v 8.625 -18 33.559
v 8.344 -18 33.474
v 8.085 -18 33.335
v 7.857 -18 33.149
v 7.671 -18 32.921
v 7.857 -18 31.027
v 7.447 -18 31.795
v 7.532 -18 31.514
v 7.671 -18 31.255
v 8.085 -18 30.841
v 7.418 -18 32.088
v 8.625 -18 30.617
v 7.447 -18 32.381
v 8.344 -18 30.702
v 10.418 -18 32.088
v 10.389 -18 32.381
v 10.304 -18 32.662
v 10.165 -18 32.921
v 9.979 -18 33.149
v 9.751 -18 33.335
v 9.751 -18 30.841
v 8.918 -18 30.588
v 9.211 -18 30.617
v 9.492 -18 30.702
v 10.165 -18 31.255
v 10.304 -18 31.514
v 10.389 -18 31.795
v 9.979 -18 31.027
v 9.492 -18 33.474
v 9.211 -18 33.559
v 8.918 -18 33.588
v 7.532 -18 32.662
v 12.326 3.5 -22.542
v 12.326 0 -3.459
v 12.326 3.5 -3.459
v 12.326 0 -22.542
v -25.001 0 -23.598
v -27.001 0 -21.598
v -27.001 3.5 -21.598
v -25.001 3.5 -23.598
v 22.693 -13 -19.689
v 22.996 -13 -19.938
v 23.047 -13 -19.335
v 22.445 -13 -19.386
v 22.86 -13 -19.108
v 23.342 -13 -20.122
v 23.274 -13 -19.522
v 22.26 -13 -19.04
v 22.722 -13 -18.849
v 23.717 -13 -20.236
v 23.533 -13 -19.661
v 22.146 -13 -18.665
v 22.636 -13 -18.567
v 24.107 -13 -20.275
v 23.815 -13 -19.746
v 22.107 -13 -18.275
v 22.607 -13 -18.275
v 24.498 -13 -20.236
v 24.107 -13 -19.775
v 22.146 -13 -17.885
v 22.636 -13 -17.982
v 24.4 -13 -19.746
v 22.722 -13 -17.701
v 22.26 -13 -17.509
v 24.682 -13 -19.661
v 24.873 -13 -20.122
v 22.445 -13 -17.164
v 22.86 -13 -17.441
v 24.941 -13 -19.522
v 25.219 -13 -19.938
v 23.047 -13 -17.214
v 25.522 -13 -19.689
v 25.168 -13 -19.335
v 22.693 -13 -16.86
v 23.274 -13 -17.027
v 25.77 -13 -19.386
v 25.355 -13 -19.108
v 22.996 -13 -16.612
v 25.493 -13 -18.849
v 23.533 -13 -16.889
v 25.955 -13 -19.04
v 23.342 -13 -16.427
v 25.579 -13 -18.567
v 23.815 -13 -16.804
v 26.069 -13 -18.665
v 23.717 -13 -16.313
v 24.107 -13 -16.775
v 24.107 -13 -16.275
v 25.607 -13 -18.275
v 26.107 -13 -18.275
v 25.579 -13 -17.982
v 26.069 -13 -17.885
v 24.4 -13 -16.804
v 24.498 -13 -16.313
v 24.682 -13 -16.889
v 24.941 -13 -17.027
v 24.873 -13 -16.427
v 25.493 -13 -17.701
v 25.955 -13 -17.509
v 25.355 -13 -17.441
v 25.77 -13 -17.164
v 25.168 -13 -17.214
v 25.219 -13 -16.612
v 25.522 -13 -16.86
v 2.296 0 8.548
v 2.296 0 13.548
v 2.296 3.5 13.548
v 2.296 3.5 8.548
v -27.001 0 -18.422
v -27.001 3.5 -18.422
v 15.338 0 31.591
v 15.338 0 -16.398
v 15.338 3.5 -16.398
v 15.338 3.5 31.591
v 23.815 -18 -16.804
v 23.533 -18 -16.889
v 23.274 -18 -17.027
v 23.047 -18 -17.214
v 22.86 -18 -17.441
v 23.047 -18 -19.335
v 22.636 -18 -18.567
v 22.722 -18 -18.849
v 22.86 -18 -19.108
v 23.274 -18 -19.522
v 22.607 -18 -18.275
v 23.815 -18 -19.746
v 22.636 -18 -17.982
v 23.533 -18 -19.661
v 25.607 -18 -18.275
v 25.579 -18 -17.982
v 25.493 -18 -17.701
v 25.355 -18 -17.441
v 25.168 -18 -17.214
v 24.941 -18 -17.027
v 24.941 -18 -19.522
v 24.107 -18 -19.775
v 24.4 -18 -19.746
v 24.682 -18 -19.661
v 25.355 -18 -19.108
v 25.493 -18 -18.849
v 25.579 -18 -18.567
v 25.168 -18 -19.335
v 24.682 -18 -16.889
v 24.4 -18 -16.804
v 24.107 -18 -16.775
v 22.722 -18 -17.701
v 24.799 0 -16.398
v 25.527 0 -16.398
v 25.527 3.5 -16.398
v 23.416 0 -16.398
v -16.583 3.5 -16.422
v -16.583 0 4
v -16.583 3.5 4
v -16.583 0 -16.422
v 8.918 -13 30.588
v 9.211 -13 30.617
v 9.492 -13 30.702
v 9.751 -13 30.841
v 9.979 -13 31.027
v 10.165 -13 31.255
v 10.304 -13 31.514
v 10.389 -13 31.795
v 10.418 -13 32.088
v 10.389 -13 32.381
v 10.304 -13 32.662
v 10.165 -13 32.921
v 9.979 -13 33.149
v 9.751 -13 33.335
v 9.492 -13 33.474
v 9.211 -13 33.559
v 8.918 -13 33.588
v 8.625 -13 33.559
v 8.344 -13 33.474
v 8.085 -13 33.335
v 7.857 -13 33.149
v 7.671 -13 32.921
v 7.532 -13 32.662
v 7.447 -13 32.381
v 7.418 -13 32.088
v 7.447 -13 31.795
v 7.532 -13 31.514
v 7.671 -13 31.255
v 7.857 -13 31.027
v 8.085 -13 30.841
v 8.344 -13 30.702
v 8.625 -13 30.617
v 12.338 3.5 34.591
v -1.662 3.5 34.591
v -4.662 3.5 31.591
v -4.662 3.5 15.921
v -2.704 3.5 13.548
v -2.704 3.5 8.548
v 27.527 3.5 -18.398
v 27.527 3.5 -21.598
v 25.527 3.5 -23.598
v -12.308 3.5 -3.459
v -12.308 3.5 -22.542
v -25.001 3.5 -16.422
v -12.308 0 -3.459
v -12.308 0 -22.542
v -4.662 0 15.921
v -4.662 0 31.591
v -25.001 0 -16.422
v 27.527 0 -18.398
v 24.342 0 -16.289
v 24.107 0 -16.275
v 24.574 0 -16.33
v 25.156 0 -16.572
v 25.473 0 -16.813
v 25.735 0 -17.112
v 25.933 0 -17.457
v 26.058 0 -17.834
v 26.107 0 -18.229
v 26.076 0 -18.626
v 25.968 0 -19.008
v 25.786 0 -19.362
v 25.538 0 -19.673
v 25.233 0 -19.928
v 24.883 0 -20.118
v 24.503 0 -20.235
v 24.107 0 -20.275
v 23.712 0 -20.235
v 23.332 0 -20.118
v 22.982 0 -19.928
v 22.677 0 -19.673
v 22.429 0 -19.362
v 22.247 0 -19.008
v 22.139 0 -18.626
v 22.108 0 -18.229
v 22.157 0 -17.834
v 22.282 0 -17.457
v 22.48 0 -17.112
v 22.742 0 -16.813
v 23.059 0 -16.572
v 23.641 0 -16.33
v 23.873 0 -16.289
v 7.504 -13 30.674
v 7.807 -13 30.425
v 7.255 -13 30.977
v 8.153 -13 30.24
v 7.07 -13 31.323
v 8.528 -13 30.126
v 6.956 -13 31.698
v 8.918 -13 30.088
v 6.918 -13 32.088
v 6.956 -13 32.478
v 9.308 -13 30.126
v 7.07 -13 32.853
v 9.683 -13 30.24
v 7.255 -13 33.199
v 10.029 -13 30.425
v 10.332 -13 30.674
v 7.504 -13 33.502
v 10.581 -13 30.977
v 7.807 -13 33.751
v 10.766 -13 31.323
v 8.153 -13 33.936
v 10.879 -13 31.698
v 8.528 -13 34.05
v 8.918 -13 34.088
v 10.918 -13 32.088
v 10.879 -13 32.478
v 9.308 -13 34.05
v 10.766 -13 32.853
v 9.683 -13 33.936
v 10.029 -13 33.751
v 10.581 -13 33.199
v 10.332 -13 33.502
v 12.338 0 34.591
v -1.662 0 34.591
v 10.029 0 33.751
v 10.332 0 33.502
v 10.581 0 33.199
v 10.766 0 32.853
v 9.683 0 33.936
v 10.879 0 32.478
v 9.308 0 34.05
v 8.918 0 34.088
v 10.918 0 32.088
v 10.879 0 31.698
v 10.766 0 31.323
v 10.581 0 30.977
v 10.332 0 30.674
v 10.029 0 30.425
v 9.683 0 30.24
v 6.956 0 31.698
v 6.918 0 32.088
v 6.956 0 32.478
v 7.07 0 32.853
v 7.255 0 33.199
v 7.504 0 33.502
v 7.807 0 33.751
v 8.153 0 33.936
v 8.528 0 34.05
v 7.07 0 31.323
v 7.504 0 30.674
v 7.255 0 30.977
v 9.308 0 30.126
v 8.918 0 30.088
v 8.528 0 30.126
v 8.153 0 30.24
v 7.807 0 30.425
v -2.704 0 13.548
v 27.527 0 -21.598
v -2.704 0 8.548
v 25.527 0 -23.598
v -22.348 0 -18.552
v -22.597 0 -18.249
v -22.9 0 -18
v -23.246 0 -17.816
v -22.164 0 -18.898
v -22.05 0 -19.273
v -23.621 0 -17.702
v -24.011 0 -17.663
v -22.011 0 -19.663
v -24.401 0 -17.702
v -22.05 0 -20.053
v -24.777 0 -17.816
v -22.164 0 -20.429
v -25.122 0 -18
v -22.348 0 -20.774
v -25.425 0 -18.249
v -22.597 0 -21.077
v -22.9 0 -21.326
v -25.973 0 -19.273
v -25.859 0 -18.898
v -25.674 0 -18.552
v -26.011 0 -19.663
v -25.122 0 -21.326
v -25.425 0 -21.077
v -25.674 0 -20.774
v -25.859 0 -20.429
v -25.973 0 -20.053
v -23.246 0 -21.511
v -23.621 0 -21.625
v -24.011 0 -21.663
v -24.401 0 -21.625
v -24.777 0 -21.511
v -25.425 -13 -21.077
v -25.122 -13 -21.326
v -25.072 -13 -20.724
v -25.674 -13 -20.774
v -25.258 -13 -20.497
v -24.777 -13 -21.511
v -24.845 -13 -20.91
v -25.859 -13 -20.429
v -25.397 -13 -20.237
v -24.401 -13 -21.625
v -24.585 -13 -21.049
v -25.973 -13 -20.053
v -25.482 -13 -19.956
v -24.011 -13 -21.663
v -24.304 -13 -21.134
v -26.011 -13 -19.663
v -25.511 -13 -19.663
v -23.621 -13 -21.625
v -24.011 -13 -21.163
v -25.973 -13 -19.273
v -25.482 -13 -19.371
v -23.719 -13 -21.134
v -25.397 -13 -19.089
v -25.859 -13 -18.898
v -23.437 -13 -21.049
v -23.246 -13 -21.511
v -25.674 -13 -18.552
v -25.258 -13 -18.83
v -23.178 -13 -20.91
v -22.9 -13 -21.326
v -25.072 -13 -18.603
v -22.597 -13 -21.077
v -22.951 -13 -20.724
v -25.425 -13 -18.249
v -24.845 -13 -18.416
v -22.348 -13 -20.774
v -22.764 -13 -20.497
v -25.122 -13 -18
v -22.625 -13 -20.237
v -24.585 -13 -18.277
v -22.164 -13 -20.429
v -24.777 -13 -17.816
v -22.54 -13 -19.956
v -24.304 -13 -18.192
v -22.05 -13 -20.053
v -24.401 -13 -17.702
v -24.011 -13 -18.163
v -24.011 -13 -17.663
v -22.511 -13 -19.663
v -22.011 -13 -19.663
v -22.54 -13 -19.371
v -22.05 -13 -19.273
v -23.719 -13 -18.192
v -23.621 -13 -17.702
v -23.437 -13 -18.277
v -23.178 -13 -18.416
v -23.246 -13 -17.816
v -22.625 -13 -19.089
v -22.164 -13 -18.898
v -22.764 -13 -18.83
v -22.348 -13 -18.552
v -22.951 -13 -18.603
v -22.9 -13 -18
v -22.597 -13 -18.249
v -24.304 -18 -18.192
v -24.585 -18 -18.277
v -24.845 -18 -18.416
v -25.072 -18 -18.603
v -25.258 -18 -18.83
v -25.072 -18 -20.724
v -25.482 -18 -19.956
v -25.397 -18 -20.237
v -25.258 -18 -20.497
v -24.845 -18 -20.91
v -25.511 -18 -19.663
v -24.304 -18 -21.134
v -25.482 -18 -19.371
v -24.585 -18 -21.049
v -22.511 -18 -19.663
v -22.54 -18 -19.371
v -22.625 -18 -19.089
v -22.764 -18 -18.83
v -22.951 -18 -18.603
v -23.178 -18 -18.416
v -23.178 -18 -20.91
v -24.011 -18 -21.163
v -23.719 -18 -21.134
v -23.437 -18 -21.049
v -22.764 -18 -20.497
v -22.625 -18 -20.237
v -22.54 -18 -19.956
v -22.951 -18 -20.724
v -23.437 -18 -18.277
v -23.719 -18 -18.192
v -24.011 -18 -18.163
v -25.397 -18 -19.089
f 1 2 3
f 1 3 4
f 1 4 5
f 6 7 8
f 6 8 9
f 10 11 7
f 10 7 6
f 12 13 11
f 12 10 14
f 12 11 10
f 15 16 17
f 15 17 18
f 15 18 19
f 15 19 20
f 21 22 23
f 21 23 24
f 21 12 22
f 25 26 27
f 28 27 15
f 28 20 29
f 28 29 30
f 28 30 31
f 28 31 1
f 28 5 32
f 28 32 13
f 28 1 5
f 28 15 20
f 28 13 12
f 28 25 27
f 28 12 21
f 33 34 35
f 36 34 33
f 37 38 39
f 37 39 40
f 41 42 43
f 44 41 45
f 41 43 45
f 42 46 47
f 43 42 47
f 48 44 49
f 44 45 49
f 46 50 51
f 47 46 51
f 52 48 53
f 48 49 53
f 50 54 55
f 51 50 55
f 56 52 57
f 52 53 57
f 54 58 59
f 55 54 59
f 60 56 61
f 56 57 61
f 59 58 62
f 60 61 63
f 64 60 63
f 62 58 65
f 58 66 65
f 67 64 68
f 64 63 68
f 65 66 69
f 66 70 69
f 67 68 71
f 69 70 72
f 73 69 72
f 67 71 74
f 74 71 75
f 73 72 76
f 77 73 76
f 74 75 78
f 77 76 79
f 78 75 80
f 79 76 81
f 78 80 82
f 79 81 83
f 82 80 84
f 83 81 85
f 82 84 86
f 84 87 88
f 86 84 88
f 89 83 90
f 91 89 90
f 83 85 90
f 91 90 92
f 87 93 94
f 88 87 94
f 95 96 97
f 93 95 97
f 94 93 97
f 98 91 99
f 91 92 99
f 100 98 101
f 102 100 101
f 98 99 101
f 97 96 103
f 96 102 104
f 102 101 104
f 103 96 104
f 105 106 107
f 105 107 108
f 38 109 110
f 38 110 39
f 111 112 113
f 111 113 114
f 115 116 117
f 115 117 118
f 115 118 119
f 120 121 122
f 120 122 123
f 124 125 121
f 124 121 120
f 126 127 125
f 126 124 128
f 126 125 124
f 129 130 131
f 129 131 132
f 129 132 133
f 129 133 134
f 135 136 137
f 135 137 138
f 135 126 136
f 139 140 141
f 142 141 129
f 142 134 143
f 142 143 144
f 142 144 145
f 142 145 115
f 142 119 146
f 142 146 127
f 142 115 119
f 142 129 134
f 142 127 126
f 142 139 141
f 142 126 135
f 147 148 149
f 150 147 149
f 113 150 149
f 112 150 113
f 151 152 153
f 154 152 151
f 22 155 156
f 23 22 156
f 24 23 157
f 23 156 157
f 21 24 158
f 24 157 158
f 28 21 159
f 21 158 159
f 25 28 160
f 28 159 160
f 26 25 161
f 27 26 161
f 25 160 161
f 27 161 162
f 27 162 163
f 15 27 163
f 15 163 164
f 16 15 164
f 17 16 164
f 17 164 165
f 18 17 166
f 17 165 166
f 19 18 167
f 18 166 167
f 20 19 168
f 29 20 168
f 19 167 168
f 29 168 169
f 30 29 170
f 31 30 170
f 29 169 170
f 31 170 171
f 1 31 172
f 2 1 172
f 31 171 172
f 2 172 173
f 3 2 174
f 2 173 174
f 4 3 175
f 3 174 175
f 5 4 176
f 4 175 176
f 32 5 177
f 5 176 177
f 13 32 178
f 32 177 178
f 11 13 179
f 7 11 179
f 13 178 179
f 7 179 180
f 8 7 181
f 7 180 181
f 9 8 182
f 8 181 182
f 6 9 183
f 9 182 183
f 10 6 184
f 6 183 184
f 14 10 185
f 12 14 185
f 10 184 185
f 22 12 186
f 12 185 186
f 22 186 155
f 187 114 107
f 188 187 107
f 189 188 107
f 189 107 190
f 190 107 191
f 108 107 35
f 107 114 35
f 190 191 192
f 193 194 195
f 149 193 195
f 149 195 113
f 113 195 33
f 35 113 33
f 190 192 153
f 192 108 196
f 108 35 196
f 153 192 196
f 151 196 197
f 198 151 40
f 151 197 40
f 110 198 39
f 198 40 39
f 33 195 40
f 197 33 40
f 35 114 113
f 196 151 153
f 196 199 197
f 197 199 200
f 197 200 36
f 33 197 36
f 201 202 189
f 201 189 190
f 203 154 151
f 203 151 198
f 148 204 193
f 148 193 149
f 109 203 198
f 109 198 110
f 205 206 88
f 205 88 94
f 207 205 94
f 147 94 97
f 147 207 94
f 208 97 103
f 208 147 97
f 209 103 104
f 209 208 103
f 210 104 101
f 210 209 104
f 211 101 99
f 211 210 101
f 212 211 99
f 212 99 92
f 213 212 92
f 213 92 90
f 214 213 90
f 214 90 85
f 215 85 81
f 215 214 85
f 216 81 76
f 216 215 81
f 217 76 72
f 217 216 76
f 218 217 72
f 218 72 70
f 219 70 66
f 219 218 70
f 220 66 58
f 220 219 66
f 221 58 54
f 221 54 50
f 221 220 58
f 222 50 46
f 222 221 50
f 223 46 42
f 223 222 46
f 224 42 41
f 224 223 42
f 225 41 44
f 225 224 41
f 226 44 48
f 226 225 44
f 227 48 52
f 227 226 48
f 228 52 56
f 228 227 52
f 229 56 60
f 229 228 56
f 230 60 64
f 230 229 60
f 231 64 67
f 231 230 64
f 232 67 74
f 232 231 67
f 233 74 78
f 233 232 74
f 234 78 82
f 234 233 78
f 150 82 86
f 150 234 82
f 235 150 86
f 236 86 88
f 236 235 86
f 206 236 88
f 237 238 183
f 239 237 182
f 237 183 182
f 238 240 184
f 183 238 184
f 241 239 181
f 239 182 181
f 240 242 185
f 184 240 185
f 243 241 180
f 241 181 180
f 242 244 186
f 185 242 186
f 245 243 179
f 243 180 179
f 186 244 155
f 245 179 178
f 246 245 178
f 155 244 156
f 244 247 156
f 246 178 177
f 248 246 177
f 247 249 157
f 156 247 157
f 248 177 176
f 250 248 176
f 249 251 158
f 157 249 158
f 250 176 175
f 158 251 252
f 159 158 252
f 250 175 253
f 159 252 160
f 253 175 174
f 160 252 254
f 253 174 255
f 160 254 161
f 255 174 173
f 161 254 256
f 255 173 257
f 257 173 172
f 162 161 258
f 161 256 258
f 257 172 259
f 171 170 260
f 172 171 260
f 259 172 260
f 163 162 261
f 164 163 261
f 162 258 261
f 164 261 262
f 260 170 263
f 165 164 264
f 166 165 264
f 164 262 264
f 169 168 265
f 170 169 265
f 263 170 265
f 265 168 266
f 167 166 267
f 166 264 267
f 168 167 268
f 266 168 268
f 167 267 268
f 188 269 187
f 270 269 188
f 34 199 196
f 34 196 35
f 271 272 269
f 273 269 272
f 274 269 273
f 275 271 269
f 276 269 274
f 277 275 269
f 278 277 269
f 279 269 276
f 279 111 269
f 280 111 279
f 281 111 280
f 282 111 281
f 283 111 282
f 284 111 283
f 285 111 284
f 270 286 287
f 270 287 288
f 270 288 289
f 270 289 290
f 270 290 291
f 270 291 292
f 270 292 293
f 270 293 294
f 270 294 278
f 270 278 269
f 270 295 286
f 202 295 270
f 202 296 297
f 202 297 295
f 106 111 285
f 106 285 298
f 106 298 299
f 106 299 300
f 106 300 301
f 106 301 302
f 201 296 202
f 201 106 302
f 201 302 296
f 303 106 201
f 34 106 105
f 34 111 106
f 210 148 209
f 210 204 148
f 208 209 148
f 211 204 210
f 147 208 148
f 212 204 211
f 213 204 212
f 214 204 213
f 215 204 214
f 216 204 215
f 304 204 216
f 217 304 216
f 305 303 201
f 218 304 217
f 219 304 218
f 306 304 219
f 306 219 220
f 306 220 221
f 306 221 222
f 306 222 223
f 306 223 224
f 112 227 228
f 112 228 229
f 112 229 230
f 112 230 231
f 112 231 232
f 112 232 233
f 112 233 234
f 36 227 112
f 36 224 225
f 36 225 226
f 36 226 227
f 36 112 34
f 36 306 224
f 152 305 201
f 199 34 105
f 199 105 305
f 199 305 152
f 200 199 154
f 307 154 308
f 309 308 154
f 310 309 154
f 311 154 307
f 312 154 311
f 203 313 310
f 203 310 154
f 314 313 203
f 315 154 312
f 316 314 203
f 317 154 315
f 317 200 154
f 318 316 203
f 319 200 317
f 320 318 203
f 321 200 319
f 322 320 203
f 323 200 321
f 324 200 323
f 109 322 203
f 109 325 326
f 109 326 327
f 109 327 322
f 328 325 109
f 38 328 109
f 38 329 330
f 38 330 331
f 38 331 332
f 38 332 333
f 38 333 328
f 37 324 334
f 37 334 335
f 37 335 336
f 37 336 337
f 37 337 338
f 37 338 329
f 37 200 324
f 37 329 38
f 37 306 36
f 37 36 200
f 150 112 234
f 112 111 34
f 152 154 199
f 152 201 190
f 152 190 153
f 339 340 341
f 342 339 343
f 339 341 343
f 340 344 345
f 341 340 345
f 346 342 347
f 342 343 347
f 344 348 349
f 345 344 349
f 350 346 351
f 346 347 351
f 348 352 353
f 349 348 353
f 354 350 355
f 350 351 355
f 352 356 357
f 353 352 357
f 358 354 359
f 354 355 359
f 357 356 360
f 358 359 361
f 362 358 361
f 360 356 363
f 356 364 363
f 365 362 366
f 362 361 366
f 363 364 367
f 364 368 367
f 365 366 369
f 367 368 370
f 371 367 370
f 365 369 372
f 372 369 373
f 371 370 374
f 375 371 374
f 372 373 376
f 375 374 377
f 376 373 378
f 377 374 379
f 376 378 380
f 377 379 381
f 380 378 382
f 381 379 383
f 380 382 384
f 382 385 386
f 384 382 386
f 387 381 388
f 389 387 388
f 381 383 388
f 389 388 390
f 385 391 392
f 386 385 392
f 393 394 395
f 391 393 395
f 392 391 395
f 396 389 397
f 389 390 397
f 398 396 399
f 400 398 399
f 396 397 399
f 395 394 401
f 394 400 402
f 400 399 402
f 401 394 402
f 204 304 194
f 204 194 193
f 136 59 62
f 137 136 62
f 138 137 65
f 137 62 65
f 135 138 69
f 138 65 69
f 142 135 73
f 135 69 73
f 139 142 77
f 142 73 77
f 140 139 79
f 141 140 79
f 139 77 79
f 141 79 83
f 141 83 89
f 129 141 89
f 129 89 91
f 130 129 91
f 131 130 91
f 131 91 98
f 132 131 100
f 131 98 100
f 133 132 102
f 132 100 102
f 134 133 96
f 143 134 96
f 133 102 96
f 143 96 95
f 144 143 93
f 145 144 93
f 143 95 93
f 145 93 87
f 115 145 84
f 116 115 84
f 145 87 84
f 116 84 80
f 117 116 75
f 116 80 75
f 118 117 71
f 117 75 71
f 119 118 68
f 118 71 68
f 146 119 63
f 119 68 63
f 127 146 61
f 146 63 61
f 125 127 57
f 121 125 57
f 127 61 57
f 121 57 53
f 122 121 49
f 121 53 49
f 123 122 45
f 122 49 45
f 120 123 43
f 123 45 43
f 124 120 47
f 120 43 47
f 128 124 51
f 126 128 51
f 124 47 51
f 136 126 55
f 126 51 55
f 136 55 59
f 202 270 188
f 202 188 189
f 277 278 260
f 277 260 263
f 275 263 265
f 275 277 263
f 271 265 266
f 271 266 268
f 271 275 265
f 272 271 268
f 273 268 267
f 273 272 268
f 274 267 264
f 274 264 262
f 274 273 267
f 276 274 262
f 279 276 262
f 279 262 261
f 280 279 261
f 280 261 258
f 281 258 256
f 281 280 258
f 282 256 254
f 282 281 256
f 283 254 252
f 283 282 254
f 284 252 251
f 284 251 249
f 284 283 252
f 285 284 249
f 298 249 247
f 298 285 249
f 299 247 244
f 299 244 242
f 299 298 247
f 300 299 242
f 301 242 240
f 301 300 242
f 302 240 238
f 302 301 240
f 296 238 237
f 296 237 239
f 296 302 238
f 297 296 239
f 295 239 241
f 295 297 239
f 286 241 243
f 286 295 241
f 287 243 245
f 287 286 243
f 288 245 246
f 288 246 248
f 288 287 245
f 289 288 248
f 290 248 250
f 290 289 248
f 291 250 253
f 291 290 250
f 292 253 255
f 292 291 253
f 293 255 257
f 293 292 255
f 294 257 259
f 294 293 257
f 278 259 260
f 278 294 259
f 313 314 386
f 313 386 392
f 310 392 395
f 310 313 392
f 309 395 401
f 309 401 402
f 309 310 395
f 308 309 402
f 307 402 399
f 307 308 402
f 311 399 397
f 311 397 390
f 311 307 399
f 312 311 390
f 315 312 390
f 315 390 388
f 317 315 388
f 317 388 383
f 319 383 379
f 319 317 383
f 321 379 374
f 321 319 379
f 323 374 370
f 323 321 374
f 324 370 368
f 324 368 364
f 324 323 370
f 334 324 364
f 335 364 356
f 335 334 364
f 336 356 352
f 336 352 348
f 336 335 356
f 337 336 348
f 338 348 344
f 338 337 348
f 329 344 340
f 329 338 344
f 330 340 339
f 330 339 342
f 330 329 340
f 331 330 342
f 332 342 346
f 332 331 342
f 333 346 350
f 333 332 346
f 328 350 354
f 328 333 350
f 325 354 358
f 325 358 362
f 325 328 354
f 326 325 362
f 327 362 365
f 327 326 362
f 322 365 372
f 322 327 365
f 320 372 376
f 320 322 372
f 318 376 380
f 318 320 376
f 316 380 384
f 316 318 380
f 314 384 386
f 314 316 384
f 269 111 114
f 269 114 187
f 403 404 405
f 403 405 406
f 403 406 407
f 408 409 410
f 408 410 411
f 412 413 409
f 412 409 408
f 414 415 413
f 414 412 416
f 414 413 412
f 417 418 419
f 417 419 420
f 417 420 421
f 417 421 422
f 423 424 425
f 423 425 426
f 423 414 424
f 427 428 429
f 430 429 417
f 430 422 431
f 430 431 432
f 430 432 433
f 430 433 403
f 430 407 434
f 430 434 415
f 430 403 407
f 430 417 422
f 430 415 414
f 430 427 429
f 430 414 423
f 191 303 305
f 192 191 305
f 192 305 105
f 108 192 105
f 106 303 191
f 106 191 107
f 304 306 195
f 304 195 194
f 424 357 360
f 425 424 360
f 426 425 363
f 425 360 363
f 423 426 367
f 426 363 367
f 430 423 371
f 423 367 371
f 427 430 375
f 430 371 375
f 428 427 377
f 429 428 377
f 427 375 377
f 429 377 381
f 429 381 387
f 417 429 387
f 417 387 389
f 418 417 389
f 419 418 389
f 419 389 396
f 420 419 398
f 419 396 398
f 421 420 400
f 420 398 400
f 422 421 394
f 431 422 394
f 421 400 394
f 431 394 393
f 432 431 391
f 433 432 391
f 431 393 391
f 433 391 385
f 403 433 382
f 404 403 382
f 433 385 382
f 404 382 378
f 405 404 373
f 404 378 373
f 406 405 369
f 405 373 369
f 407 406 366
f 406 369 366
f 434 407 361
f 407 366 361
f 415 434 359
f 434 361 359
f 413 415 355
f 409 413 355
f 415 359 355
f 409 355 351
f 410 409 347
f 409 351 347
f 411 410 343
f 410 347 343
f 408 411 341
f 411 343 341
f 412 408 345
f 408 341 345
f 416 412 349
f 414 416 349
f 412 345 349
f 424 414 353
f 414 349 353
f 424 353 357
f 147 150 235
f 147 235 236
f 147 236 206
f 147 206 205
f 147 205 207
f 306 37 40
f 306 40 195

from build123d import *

# Parameters (mm, degrees)
SKETCH4_W           = 24.633837396
SKETCH4_H           = 19.082768461
SKETCH4_W_2         = 5
SKETCH4_H_2         = 5
MAINBRACKET_DEPTH   = 3.5
SKETCH3_R           = 2
BOSS_EXTRUDE2_DEPTH = 13
SKETCH6_R           = 1.5
BOSS_EXTRUDE3_DEPTH = 5


with BuildPart() as part:
    # Sketch4 → MainBracket (new body)
    with BuildSketch(Plane(origin=(0, 0, 0), x_dir=(1, 0, 0), z_dir=(0, 1, 0))):
        Polygon((-25.001052975, 23.597895529), (25.52718448, 23.597895529), (27.52718448, 21.597895529), (27.52718448, 18.397895529), (25.52718448, 16.397895529), (15.338231538, 16.397895529), (15.338231538, -31.590979949), (12.338231538, -34.590979949), (-1.661768462, -34.590979949), (-4.661768462, -31.590979949), (-4.661768462, -15.921260677), (-16.583029139, -4), (-16.583029139, 16.421906692), (-25.001052975, 16.421906692), (-27.001052975, 18.421906692), (-27.001052975, 21.597895529), align=None)
        with Locations((0.008956485, 13.000441896)):
            Rectangle(SKETCH4_W, SKETCH4_H, mode=Mode.SUBTRACT)
        with Locations((-0.204070078, -11.047717724)):
            Rectangle(SKETCH4_W_2, SKETCH4_H_2, mode=Mode.SUBTRACT)
    extrude(amount=MAINBRACKET_DEPTH)

    # Sketch3 → Boss-Extrude2 (add)
    with BuildSketch(Plane(origin=(0, 0, 0), x_dir=(1, 0, 0), z_dir=(0, 1, 0))):
        with Locations((-24.011269627, 19.663273311)):
            Circle(SKETCH3_R)
        with Locations((24.107482847, 18.27469294)):
            Circle(SKETCH3_R)
        with Locations((8.917908931, -32.088026328)):
            Circle(SKETCH3_R)
    extrude(amount=-BOSS_EXTRUDE2_DEPTH)

    # Sketch6 → Boss-Extrude3 (add)
    with BuildSketch(Plane.XZ.offset(13)):
        with Locations((-24.011269627, -19.663273311)):
            Circle(SKETCH6_R)
        with Locations((8.917908931, 32.088026328)):
            Circle(SKETCH6_R)
        with Locations((24.107482847, -18.27469294)):
            Circle(SKETCH6_R)
    extrude(amount=BOSS_EXTRUDE3_DEPTH)


solid = part.part
